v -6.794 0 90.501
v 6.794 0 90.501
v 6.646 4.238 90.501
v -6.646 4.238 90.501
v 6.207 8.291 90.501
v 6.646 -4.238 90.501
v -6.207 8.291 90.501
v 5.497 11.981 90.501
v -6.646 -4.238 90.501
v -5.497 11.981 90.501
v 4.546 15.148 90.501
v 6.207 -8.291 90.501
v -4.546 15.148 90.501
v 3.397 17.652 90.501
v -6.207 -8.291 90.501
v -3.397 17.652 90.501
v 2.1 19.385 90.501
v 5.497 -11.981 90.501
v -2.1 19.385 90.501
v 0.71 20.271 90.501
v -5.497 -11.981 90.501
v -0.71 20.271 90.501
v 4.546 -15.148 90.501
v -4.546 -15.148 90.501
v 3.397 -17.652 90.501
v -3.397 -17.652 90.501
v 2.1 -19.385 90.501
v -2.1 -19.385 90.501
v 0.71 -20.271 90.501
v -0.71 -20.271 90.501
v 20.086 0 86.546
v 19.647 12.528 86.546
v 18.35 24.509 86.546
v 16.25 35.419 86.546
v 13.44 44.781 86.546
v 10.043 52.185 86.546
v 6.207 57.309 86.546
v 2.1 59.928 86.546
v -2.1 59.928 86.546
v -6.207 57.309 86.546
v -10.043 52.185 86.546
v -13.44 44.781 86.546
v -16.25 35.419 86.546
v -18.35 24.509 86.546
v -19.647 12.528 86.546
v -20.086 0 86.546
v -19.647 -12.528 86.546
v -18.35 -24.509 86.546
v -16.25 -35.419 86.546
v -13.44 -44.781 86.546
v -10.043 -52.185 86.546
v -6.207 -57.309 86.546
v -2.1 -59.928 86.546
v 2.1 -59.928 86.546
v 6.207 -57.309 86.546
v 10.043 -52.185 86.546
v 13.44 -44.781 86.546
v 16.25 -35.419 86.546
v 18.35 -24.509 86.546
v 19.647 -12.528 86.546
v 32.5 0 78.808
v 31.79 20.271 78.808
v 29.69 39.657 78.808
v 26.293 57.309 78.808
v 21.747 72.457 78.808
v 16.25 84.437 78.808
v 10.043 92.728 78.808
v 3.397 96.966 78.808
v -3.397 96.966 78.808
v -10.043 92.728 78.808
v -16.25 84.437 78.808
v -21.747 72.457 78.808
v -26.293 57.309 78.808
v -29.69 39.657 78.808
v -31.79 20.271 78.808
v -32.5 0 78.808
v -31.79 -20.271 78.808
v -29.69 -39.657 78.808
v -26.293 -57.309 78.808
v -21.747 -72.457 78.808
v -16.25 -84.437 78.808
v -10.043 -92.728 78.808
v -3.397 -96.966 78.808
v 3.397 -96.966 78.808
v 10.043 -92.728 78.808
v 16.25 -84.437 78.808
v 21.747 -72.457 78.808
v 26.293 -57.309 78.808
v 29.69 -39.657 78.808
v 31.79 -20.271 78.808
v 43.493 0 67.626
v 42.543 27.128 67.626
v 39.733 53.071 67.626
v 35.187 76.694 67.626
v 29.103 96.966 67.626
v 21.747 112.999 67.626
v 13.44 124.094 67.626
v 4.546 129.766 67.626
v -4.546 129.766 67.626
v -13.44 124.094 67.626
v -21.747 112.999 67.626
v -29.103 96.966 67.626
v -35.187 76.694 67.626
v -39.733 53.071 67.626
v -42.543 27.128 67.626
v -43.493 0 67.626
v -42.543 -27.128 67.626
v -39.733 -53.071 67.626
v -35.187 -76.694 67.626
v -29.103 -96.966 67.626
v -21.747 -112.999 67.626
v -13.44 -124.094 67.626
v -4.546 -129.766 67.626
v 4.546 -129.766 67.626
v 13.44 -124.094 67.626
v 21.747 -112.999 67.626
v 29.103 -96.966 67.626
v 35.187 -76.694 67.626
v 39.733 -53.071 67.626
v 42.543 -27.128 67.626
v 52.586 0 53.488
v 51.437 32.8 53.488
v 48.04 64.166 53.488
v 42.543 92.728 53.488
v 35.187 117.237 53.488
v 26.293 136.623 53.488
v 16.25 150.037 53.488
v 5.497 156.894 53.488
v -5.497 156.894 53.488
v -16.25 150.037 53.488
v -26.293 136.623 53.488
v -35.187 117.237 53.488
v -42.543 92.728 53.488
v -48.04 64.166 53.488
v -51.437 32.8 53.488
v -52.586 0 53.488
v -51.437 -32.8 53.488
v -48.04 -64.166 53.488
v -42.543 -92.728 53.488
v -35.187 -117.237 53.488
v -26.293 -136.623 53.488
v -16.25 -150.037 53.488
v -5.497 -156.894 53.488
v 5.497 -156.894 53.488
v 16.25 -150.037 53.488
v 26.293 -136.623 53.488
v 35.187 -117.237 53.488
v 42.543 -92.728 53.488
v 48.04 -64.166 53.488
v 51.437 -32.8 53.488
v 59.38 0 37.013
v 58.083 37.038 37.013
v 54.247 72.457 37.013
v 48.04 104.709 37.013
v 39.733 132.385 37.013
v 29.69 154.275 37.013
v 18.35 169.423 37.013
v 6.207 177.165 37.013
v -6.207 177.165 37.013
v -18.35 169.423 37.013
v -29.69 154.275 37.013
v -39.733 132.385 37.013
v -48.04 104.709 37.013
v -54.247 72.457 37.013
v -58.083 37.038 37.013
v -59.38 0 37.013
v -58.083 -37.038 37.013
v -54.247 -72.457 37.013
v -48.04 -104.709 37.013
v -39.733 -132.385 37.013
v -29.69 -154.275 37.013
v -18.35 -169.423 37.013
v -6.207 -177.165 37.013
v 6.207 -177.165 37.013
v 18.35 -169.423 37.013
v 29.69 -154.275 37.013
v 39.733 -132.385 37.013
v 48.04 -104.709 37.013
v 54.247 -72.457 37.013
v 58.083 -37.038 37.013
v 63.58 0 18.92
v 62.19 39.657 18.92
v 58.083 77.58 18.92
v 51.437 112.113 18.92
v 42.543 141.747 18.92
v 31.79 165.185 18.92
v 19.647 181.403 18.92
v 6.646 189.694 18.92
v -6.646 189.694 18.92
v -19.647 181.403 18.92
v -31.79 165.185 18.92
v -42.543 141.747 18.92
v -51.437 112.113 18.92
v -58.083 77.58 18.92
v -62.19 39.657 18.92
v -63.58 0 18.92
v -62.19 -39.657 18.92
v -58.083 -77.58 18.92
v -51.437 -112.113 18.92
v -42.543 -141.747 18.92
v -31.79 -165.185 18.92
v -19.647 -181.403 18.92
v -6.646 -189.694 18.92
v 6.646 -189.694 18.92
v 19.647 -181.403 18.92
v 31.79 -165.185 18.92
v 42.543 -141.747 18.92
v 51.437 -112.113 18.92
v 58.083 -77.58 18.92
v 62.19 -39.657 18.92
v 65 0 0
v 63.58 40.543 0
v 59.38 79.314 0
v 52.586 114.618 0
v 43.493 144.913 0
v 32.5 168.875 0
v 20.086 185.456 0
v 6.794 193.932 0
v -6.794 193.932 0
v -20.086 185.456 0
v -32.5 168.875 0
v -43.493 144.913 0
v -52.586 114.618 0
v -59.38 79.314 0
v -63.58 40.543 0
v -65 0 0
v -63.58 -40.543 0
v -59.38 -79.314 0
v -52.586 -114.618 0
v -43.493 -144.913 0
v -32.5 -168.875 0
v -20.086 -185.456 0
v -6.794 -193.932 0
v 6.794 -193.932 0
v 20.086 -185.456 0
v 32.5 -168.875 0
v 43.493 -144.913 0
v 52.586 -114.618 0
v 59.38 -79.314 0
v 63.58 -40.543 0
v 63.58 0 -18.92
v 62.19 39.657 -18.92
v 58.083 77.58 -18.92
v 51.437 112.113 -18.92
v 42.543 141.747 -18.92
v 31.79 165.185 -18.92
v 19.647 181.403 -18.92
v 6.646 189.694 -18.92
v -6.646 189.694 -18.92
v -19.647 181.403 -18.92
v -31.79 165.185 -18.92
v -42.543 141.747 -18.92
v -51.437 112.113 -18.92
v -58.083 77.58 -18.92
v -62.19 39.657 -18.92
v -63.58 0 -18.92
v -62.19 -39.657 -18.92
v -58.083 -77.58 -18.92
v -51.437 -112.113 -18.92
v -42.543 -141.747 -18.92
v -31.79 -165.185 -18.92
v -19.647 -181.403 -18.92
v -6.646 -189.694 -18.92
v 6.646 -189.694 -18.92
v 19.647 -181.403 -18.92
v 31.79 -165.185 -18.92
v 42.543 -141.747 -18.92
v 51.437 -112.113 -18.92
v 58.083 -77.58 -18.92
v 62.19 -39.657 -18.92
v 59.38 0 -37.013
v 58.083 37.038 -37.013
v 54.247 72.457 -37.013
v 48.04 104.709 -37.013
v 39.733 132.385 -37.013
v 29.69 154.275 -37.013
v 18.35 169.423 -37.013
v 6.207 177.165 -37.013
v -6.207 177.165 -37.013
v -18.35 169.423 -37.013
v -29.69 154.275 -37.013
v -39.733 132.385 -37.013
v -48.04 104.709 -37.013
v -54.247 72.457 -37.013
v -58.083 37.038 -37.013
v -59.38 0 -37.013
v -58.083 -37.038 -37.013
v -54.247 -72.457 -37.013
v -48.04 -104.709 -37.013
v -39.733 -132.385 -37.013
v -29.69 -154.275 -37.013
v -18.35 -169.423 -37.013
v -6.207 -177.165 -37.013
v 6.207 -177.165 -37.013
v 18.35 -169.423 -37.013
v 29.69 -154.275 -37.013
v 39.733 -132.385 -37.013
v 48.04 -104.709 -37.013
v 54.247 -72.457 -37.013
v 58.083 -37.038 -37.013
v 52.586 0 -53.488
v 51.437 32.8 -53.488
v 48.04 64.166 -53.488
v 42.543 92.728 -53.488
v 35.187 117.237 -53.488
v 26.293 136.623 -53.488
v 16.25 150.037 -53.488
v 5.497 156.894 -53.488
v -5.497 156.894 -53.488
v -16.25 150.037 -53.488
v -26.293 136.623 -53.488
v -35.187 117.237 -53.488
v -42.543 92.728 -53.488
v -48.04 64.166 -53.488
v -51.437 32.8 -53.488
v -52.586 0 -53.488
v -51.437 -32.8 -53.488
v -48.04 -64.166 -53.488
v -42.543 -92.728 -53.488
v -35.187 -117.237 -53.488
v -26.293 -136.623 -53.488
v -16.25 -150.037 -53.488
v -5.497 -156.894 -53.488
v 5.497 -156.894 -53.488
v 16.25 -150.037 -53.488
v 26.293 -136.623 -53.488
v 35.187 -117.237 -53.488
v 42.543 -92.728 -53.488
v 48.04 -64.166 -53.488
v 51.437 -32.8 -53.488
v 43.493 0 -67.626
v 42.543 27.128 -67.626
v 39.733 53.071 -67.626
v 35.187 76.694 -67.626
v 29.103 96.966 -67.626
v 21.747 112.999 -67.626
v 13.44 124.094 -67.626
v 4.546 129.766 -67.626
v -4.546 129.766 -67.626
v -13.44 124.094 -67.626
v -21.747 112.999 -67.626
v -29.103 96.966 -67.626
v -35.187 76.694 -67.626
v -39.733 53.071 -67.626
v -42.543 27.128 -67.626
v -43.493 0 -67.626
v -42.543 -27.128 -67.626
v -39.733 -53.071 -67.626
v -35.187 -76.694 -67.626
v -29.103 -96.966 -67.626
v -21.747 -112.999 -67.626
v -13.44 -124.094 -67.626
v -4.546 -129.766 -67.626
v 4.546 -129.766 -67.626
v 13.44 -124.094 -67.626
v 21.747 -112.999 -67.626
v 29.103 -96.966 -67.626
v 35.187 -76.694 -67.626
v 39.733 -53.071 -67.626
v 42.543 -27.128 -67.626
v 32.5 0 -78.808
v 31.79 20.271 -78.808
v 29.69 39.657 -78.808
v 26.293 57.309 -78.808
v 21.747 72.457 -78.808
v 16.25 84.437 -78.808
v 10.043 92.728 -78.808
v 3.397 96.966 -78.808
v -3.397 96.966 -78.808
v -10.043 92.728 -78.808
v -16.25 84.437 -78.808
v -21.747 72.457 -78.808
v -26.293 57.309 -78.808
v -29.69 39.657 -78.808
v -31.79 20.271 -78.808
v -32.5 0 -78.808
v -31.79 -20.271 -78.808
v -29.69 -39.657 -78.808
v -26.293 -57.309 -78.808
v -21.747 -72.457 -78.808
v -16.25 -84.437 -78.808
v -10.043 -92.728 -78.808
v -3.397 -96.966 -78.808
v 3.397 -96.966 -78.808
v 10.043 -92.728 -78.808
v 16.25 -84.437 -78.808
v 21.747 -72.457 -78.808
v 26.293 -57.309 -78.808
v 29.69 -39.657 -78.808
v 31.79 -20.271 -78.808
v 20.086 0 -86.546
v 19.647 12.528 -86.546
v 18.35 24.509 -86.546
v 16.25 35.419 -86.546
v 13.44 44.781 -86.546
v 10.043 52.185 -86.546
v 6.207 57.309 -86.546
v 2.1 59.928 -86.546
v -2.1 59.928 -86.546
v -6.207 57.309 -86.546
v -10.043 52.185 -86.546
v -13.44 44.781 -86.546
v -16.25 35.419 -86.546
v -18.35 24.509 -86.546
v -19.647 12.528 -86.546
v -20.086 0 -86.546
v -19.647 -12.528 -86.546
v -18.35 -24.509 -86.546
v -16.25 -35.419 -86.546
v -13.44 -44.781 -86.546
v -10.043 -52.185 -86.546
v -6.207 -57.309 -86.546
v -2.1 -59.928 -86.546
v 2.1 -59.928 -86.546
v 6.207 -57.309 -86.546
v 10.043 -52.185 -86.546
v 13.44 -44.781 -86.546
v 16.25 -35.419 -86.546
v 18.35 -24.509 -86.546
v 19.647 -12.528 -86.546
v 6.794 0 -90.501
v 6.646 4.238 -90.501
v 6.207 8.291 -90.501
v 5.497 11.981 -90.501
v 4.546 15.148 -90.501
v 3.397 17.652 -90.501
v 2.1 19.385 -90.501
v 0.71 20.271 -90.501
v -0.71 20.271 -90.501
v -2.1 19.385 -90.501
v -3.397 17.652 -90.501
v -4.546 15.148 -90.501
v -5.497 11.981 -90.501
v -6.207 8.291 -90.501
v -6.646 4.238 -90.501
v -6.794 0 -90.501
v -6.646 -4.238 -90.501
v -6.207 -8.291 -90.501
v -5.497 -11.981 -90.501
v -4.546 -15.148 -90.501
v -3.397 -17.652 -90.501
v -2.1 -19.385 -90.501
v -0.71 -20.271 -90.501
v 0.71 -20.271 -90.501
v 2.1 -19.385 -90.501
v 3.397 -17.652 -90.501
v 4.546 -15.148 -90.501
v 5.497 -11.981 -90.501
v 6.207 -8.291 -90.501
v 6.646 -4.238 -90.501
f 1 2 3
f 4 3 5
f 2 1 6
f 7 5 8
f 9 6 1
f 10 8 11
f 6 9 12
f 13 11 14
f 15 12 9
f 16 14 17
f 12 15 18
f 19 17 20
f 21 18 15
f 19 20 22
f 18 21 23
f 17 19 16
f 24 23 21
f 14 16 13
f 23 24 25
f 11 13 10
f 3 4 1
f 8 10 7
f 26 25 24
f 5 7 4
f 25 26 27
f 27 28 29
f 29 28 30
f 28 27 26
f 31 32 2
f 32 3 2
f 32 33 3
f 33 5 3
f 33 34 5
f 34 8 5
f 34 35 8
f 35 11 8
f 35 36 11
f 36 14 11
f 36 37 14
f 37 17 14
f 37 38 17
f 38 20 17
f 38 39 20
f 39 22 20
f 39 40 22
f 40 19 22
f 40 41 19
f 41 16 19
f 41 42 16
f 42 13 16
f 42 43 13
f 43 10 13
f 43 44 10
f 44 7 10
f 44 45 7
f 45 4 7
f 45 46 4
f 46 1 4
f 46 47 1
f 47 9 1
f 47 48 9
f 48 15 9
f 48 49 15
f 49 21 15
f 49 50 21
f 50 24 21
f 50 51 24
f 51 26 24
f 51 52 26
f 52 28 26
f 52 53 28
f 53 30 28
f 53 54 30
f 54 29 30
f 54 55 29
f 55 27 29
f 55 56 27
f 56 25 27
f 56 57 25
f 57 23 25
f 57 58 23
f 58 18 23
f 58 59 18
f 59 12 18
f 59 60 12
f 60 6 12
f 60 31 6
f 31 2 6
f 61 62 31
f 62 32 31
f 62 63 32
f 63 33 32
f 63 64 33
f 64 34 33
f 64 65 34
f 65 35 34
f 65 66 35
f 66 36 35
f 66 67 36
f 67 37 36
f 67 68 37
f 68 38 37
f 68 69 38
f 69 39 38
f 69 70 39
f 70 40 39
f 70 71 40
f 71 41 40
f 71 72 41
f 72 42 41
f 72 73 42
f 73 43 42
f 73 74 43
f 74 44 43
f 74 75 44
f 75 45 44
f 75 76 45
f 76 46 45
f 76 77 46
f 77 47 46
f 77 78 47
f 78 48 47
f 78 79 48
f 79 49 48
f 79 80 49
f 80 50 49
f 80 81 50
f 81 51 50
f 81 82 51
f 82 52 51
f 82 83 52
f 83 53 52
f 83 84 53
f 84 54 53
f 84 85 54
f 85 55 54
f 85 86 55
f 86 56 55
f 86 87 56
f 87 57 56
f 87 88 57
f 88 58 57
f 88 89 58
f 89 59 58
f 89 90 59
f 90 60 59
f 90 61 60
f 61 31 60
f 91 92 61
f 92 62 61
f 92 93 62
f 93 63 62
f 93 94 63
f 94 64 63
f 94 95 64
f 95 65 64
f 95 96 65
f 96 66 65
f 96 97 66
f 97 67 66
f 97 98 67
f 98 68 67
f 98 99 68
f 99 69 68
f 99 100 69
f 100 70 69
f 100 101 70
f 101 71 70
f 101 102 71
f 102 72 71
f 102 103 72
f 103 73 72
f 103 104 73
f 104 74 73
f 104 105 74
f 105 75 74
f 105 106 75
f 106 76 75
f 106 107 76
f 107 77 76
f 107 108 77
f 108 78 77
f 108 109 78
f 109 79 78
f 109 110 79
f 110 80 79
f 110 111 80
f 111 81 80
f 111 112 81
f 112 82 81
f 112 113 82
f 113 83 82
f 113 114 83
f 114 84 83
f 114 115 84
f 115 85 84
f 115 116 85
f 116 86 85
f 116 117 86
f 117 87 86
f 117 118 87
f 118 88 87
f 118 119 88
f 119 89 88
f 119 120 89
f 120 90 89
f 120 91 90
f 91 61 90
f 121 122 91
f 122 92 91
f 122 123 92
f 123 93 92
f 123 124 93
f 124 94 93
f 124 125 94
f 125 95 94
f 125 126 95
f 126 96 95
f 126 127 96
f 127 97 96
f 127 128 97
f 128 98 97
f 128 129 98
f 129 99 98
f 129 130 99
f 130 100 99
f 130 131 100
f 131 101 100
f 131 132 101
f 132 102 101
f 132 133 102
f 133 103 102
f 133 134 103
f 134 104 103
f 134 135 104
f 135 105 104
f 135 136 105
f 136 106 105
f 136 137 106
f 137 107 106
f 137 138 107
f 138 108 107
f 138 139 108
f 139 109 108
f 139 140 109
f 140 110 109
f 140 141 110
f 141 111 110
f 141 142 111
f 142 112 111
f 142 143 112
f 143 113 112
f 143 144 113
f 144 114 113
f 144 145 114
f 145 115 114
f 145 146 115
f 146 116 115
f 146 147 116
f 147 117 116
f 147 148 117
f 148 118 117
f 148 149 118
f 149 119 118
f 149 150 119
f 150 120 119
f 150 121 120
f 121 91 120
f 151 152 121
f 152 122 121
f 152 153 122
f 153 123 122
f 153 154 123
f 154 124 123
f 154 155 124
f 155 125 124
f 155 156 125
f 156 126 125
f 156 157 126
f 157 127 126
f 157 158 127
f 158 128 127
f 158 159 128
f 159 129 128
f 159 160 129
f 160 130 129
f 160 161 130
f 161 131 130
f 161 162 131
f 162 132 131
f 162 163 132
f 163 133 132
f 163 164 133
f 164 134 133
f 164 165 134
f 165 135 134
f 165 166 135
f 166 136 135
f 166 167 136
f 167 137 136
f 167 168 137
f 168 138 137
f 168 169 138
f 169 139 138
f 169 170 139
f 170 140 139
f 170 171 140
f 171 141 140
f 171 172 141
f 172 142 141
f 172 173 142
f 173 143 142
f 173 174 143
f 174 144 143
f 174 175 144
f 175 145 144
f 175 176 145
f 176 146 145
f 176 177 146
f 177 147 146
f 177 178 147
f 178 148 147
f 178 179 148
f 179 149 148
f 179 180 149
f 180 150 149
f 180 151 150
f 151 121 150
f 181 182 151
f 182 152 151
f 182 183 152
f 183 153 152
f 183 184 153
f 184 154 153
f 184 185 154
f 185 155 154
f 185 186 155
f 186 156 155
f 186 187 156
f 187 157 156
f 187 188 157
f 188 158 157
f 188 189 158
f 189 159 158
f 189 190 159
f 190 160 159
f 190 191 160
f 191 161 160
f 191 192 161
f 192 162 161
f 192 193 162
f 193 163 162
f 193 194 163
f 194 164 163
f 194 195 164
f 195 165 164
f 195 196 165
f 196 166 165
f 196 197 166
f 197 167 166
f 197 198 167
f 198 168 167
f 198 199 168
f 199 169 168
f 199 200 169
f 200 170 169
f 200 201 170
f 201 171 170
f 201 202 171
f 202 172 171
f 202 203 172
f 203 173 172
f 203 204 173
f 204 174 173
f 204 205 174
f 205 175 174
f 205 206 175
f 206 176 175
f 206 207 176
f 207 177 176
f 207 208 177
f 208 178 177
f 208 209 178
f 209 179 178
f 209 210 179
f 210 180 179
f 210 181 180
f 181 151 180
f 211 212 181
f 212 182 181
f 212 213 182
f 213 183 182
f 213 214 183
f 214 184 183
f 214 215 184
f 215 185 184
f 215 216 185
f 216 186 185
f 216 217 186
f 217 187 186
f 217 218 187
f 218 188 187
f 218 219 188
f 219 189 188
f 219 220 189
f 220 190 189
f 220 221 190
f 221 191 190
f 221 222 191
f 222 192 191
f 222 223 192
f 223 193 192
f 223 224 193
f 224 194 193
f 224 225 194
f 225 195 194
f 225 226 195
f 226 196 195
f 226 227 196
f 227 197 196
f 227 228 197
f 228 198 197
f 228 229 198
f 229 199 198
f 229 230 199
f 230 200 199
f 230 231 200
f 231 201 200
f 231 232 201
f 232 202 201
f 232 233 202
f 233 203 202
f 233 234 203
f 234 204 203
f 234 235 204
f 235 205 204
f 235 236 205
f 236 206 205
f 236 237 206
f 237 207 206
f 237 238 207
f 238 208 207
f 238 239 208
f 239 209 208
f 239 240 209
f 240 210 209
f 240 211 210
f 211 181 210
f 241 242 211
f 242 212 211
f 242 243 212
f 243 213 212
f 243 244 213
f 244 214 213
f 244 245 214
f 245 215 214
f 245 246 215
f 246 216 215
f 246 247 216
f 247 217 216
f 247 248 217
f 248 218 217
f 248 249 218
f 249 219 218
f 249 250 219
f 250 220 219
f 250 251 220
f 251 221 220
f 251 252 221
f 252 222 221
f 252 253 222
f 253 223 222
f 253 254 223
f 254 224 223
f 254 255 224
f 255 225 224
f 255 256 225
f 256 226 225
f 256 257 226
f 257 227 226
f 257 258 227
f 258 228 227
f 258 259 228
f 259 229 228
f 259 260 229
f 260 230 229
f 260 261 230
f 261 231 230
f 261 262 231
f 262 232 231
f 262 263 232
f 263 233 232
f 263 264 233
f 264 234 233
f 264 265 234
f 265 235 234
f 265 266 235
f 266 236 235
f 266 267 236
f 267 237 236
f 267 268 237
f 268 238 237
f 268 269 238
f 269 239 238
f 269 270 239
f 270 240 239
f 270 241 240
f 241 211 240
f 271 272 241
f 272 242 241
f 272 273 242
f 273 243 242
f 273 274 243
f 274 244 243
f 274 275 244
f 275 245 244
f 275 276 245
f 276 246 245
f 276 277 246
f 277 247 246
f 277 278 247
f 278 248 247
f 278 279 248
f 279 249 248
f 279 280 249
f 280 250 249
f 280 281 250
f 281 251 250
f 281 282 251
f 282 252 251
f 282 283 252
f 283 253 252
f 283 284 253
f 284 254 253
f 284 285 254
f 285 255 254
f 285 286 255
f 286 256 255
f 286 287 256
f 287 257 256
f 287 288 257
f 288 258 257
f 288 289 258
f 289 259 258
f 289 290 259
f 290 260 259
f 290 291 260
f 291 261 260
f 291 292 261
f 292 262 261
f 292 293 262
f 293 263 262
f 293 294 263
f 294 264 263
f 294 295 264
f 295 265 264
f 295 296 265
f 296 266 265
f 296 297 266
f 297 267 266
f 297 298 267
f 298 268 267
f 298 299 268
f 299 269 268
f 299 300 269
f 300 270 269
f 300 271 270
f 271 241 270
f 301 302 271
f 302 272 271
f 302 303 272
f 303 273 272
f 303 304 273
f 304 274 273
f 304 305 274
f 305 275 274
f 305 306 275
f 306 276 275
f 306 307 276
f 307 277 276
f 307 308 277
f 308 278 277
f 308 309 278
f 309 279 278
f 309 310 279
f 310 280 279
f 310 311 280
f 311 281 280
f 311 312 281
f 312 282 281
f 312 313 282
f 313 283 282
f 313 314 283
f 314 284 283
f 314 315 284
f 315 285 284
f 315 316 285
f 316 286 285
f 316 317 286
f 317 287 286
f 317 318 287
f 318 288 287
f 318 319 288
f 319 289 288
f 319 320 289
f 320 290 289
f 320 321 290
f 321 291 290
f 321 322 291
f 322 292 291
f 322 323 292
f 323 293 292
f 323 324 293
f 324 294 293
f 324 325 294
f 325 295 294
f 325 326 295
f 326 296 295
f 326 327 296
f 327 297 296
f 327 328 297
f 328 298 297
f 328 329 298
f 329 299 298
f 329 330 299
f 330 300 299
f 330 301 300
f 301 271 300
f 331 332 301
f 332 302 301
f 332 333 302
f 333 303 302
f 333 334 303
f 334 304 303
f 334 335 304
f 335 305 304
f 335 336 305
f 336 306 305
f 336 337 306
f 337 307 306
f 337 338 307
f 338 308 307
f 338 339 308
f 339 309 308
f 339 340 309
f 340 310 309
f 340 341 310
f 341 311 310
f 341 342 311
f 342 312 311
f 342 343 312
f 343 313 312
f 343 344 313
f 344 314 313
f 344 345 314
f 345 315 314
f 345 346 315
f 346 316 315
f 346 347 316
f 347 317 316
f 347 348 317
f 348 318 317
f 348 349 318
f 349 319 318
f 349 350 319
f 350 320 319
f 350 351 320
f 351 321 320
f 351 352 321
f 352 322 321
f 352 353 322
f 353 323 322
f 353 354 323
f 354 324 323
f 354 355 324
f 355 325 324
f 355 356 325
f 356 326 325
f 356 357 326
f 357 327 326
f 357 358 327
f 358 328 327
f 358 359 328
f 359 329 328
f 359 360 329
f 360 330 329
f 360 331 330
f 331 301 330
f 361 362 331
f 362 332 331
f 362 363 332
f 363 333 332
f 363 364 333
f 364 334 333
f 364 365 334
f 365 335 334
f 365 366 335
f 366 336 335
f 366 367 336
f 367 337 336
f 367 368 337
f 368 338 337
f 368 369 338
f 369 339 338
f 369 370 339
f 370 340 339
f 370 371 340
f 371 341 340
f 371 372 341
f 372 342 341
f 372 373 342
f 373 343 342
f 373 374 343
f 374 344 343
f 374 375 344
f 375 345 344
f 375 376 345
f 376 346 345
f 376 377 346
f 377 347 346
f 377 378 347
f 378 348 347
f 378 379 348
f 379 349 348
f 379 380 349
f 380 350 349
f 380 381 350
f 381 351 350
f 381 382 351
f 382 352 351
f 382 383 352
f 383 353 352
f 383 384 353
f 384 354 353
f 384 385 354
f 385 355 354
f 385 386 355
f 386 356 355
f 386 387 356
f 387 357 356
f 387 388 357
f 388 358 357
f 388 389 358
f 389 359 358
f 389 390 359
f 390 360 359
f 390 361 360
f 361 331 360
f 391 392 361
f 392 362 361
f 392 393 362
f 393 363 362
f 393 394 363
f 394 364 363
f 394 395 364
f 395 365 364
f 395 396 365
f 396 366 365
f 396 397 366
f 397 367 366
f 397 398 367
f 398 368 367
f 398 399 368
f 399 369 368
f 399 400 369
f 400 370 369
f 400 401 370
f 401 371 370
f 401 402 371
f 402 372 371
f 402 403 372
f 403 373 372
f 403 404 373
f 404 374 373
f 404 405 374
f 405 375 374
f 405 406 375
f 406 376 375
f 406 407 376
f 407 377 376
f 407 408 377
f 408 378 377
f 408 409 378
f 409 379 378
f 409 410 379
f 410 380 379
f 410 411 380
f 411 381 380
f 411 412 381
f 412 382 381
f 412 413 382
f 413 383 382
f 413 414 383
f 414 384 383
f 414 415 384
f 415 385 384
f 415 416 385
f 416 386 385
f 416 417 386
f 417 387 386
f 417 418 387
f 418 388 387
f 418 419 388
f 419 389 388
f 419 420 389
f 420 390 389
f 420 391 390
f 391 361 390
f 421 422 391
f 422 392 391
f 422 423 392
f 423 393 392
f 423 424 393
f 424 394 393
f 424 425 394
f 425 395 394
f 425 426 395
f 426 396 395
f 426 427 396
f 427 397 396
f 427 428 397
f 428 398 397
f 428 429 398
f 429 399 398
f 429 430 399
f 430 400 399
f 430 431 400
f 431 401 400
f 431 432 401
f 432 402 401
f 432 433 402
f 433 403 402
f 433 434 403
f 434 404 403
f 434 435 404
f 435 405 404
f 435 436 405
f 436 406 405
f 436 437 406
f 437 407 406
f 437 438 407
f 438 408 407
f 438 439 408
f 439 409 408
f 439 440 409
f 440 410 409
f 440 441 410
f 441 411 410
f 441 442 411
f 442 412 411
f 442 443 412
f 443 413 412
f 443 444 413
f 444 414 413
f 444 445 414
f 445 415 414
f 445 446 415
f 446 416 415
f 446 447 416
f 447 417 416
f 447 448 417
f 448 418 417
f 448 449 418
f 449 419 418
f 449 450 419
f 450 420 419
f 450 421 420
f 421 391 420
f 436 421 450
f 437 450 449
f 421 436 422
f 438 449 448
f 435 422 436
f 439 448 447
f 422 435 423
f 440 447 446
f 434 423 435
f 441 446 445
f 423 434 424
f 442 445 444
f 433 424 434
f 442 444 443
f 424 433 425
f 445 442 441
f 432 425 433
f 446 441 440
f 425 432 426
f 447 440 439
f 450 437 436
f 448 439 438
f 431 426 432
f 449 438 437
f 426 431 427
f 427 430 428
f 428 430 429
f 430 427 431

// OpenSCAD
// Generated by SolidPython 1.0.1 on 2020-07-29 00:46:46


scale(v = [5, 15, 7]) {
	sphere(r = 13);
}
/***********************************************
*********      SolidPython code:      **********
************************************************
 
# import packages: SolidPython
from solid import *
from solid.utils import *
from itertools import chain, combinations, permutations


class Resize:

    def __init__(self, scad_file):
        self.scad_file = scad_file
        #self.scad_file = import_scad(scad_file)
        # cone/cylinder param:
        self.r1 = 0
        self.r2 = 0
        self.h = 0
        # rectangular prism param:
        self.w = 0
        self.l = 0
        # ellipse param:
        self.r = 0

    # import OpenScad code (file name corresponds to shape)


    # classify shape + parameters
    def assign(self, param1, param2, param3):
        if self.scad_file == 'cone.scad':
            self.r1 = param1
            self.r2 = param2
            self.h = param3
        elif self.scad_file == 'cylinder.scad':
            self.r1 = param1
            self.r2 = param2
            self.h = param3
        elif self.scad_file == 'rectangularPrism.scad':
            self.h = param1
            self.l = param2
            self.w = param3
        else:
            self.r = param1
            self.h = param2

    # resize parameters
    def iterate(self):
        x = range(3, 20, 2)
        i = 1
        if self.scad_file == 'cone.scad':
            tempList = list(permutations(x, 2))
            for temp in tempList:
                param1 = temp[0]
                param2 = temp[1]
                filepath = 'produced_scad_files/' + 'cone' + str(param1) + '_' + str(param2) + '_' + '.scad'
                scad_render_to_file(cylinder(h=param1, r1=param2, r2=0), filepath)

        elif self.scad_file == 'cylinder.scad':
            tempList = list(permutations(x, 3))
            for temp in tempList:
                param1 = temp[0]
                param2 = temp[1]
                filepath = 'produced_scad_files/' + 'cylinder' + str(param1) + '_' + str(param2) + '_' + '.scad'
                scad_render_to_file(cylinder(h=param1, r1=param2, r2=param2), filepath)

        elif self.scad_file == 'rectangularPrism.scad':
            tempList = list(permutations(x, 3))
            for temp in tempList:
                param1 = temp[0]
                param2 = temp[1]
                param3 = temp[2]
                filepath = 'produced_scad_files/' + 'rectangularPrism' + str(param1) + '_' + str(param2) + '_' + str(
                    param3) + '.scad'
                scad_render_to_file(cube(size=(param1, param2, param3)), filepath)

        elif self.scad_file == 'ellipse.scad':
            tempList = list(permutations(x, 4))
            for temp in tempList:
                param1 = temp[0]
                param2 = temp[1]
                param3 = temp[2]
                param4 = temp[3]
                filepath = 'produced_scad_files/' + 'ellipse' + str(param1) + '_' + str(param2) + '_' + str(param3) + '_' + str(param4) + '.scad'
                scad_render_to_file(scale([param1, param2, param3])(sphere(r=param4)), filepath)

    def render_to_scadfile(self):
        scad_render_to_file(scad, 'example.scad') 
 
************************************************/
